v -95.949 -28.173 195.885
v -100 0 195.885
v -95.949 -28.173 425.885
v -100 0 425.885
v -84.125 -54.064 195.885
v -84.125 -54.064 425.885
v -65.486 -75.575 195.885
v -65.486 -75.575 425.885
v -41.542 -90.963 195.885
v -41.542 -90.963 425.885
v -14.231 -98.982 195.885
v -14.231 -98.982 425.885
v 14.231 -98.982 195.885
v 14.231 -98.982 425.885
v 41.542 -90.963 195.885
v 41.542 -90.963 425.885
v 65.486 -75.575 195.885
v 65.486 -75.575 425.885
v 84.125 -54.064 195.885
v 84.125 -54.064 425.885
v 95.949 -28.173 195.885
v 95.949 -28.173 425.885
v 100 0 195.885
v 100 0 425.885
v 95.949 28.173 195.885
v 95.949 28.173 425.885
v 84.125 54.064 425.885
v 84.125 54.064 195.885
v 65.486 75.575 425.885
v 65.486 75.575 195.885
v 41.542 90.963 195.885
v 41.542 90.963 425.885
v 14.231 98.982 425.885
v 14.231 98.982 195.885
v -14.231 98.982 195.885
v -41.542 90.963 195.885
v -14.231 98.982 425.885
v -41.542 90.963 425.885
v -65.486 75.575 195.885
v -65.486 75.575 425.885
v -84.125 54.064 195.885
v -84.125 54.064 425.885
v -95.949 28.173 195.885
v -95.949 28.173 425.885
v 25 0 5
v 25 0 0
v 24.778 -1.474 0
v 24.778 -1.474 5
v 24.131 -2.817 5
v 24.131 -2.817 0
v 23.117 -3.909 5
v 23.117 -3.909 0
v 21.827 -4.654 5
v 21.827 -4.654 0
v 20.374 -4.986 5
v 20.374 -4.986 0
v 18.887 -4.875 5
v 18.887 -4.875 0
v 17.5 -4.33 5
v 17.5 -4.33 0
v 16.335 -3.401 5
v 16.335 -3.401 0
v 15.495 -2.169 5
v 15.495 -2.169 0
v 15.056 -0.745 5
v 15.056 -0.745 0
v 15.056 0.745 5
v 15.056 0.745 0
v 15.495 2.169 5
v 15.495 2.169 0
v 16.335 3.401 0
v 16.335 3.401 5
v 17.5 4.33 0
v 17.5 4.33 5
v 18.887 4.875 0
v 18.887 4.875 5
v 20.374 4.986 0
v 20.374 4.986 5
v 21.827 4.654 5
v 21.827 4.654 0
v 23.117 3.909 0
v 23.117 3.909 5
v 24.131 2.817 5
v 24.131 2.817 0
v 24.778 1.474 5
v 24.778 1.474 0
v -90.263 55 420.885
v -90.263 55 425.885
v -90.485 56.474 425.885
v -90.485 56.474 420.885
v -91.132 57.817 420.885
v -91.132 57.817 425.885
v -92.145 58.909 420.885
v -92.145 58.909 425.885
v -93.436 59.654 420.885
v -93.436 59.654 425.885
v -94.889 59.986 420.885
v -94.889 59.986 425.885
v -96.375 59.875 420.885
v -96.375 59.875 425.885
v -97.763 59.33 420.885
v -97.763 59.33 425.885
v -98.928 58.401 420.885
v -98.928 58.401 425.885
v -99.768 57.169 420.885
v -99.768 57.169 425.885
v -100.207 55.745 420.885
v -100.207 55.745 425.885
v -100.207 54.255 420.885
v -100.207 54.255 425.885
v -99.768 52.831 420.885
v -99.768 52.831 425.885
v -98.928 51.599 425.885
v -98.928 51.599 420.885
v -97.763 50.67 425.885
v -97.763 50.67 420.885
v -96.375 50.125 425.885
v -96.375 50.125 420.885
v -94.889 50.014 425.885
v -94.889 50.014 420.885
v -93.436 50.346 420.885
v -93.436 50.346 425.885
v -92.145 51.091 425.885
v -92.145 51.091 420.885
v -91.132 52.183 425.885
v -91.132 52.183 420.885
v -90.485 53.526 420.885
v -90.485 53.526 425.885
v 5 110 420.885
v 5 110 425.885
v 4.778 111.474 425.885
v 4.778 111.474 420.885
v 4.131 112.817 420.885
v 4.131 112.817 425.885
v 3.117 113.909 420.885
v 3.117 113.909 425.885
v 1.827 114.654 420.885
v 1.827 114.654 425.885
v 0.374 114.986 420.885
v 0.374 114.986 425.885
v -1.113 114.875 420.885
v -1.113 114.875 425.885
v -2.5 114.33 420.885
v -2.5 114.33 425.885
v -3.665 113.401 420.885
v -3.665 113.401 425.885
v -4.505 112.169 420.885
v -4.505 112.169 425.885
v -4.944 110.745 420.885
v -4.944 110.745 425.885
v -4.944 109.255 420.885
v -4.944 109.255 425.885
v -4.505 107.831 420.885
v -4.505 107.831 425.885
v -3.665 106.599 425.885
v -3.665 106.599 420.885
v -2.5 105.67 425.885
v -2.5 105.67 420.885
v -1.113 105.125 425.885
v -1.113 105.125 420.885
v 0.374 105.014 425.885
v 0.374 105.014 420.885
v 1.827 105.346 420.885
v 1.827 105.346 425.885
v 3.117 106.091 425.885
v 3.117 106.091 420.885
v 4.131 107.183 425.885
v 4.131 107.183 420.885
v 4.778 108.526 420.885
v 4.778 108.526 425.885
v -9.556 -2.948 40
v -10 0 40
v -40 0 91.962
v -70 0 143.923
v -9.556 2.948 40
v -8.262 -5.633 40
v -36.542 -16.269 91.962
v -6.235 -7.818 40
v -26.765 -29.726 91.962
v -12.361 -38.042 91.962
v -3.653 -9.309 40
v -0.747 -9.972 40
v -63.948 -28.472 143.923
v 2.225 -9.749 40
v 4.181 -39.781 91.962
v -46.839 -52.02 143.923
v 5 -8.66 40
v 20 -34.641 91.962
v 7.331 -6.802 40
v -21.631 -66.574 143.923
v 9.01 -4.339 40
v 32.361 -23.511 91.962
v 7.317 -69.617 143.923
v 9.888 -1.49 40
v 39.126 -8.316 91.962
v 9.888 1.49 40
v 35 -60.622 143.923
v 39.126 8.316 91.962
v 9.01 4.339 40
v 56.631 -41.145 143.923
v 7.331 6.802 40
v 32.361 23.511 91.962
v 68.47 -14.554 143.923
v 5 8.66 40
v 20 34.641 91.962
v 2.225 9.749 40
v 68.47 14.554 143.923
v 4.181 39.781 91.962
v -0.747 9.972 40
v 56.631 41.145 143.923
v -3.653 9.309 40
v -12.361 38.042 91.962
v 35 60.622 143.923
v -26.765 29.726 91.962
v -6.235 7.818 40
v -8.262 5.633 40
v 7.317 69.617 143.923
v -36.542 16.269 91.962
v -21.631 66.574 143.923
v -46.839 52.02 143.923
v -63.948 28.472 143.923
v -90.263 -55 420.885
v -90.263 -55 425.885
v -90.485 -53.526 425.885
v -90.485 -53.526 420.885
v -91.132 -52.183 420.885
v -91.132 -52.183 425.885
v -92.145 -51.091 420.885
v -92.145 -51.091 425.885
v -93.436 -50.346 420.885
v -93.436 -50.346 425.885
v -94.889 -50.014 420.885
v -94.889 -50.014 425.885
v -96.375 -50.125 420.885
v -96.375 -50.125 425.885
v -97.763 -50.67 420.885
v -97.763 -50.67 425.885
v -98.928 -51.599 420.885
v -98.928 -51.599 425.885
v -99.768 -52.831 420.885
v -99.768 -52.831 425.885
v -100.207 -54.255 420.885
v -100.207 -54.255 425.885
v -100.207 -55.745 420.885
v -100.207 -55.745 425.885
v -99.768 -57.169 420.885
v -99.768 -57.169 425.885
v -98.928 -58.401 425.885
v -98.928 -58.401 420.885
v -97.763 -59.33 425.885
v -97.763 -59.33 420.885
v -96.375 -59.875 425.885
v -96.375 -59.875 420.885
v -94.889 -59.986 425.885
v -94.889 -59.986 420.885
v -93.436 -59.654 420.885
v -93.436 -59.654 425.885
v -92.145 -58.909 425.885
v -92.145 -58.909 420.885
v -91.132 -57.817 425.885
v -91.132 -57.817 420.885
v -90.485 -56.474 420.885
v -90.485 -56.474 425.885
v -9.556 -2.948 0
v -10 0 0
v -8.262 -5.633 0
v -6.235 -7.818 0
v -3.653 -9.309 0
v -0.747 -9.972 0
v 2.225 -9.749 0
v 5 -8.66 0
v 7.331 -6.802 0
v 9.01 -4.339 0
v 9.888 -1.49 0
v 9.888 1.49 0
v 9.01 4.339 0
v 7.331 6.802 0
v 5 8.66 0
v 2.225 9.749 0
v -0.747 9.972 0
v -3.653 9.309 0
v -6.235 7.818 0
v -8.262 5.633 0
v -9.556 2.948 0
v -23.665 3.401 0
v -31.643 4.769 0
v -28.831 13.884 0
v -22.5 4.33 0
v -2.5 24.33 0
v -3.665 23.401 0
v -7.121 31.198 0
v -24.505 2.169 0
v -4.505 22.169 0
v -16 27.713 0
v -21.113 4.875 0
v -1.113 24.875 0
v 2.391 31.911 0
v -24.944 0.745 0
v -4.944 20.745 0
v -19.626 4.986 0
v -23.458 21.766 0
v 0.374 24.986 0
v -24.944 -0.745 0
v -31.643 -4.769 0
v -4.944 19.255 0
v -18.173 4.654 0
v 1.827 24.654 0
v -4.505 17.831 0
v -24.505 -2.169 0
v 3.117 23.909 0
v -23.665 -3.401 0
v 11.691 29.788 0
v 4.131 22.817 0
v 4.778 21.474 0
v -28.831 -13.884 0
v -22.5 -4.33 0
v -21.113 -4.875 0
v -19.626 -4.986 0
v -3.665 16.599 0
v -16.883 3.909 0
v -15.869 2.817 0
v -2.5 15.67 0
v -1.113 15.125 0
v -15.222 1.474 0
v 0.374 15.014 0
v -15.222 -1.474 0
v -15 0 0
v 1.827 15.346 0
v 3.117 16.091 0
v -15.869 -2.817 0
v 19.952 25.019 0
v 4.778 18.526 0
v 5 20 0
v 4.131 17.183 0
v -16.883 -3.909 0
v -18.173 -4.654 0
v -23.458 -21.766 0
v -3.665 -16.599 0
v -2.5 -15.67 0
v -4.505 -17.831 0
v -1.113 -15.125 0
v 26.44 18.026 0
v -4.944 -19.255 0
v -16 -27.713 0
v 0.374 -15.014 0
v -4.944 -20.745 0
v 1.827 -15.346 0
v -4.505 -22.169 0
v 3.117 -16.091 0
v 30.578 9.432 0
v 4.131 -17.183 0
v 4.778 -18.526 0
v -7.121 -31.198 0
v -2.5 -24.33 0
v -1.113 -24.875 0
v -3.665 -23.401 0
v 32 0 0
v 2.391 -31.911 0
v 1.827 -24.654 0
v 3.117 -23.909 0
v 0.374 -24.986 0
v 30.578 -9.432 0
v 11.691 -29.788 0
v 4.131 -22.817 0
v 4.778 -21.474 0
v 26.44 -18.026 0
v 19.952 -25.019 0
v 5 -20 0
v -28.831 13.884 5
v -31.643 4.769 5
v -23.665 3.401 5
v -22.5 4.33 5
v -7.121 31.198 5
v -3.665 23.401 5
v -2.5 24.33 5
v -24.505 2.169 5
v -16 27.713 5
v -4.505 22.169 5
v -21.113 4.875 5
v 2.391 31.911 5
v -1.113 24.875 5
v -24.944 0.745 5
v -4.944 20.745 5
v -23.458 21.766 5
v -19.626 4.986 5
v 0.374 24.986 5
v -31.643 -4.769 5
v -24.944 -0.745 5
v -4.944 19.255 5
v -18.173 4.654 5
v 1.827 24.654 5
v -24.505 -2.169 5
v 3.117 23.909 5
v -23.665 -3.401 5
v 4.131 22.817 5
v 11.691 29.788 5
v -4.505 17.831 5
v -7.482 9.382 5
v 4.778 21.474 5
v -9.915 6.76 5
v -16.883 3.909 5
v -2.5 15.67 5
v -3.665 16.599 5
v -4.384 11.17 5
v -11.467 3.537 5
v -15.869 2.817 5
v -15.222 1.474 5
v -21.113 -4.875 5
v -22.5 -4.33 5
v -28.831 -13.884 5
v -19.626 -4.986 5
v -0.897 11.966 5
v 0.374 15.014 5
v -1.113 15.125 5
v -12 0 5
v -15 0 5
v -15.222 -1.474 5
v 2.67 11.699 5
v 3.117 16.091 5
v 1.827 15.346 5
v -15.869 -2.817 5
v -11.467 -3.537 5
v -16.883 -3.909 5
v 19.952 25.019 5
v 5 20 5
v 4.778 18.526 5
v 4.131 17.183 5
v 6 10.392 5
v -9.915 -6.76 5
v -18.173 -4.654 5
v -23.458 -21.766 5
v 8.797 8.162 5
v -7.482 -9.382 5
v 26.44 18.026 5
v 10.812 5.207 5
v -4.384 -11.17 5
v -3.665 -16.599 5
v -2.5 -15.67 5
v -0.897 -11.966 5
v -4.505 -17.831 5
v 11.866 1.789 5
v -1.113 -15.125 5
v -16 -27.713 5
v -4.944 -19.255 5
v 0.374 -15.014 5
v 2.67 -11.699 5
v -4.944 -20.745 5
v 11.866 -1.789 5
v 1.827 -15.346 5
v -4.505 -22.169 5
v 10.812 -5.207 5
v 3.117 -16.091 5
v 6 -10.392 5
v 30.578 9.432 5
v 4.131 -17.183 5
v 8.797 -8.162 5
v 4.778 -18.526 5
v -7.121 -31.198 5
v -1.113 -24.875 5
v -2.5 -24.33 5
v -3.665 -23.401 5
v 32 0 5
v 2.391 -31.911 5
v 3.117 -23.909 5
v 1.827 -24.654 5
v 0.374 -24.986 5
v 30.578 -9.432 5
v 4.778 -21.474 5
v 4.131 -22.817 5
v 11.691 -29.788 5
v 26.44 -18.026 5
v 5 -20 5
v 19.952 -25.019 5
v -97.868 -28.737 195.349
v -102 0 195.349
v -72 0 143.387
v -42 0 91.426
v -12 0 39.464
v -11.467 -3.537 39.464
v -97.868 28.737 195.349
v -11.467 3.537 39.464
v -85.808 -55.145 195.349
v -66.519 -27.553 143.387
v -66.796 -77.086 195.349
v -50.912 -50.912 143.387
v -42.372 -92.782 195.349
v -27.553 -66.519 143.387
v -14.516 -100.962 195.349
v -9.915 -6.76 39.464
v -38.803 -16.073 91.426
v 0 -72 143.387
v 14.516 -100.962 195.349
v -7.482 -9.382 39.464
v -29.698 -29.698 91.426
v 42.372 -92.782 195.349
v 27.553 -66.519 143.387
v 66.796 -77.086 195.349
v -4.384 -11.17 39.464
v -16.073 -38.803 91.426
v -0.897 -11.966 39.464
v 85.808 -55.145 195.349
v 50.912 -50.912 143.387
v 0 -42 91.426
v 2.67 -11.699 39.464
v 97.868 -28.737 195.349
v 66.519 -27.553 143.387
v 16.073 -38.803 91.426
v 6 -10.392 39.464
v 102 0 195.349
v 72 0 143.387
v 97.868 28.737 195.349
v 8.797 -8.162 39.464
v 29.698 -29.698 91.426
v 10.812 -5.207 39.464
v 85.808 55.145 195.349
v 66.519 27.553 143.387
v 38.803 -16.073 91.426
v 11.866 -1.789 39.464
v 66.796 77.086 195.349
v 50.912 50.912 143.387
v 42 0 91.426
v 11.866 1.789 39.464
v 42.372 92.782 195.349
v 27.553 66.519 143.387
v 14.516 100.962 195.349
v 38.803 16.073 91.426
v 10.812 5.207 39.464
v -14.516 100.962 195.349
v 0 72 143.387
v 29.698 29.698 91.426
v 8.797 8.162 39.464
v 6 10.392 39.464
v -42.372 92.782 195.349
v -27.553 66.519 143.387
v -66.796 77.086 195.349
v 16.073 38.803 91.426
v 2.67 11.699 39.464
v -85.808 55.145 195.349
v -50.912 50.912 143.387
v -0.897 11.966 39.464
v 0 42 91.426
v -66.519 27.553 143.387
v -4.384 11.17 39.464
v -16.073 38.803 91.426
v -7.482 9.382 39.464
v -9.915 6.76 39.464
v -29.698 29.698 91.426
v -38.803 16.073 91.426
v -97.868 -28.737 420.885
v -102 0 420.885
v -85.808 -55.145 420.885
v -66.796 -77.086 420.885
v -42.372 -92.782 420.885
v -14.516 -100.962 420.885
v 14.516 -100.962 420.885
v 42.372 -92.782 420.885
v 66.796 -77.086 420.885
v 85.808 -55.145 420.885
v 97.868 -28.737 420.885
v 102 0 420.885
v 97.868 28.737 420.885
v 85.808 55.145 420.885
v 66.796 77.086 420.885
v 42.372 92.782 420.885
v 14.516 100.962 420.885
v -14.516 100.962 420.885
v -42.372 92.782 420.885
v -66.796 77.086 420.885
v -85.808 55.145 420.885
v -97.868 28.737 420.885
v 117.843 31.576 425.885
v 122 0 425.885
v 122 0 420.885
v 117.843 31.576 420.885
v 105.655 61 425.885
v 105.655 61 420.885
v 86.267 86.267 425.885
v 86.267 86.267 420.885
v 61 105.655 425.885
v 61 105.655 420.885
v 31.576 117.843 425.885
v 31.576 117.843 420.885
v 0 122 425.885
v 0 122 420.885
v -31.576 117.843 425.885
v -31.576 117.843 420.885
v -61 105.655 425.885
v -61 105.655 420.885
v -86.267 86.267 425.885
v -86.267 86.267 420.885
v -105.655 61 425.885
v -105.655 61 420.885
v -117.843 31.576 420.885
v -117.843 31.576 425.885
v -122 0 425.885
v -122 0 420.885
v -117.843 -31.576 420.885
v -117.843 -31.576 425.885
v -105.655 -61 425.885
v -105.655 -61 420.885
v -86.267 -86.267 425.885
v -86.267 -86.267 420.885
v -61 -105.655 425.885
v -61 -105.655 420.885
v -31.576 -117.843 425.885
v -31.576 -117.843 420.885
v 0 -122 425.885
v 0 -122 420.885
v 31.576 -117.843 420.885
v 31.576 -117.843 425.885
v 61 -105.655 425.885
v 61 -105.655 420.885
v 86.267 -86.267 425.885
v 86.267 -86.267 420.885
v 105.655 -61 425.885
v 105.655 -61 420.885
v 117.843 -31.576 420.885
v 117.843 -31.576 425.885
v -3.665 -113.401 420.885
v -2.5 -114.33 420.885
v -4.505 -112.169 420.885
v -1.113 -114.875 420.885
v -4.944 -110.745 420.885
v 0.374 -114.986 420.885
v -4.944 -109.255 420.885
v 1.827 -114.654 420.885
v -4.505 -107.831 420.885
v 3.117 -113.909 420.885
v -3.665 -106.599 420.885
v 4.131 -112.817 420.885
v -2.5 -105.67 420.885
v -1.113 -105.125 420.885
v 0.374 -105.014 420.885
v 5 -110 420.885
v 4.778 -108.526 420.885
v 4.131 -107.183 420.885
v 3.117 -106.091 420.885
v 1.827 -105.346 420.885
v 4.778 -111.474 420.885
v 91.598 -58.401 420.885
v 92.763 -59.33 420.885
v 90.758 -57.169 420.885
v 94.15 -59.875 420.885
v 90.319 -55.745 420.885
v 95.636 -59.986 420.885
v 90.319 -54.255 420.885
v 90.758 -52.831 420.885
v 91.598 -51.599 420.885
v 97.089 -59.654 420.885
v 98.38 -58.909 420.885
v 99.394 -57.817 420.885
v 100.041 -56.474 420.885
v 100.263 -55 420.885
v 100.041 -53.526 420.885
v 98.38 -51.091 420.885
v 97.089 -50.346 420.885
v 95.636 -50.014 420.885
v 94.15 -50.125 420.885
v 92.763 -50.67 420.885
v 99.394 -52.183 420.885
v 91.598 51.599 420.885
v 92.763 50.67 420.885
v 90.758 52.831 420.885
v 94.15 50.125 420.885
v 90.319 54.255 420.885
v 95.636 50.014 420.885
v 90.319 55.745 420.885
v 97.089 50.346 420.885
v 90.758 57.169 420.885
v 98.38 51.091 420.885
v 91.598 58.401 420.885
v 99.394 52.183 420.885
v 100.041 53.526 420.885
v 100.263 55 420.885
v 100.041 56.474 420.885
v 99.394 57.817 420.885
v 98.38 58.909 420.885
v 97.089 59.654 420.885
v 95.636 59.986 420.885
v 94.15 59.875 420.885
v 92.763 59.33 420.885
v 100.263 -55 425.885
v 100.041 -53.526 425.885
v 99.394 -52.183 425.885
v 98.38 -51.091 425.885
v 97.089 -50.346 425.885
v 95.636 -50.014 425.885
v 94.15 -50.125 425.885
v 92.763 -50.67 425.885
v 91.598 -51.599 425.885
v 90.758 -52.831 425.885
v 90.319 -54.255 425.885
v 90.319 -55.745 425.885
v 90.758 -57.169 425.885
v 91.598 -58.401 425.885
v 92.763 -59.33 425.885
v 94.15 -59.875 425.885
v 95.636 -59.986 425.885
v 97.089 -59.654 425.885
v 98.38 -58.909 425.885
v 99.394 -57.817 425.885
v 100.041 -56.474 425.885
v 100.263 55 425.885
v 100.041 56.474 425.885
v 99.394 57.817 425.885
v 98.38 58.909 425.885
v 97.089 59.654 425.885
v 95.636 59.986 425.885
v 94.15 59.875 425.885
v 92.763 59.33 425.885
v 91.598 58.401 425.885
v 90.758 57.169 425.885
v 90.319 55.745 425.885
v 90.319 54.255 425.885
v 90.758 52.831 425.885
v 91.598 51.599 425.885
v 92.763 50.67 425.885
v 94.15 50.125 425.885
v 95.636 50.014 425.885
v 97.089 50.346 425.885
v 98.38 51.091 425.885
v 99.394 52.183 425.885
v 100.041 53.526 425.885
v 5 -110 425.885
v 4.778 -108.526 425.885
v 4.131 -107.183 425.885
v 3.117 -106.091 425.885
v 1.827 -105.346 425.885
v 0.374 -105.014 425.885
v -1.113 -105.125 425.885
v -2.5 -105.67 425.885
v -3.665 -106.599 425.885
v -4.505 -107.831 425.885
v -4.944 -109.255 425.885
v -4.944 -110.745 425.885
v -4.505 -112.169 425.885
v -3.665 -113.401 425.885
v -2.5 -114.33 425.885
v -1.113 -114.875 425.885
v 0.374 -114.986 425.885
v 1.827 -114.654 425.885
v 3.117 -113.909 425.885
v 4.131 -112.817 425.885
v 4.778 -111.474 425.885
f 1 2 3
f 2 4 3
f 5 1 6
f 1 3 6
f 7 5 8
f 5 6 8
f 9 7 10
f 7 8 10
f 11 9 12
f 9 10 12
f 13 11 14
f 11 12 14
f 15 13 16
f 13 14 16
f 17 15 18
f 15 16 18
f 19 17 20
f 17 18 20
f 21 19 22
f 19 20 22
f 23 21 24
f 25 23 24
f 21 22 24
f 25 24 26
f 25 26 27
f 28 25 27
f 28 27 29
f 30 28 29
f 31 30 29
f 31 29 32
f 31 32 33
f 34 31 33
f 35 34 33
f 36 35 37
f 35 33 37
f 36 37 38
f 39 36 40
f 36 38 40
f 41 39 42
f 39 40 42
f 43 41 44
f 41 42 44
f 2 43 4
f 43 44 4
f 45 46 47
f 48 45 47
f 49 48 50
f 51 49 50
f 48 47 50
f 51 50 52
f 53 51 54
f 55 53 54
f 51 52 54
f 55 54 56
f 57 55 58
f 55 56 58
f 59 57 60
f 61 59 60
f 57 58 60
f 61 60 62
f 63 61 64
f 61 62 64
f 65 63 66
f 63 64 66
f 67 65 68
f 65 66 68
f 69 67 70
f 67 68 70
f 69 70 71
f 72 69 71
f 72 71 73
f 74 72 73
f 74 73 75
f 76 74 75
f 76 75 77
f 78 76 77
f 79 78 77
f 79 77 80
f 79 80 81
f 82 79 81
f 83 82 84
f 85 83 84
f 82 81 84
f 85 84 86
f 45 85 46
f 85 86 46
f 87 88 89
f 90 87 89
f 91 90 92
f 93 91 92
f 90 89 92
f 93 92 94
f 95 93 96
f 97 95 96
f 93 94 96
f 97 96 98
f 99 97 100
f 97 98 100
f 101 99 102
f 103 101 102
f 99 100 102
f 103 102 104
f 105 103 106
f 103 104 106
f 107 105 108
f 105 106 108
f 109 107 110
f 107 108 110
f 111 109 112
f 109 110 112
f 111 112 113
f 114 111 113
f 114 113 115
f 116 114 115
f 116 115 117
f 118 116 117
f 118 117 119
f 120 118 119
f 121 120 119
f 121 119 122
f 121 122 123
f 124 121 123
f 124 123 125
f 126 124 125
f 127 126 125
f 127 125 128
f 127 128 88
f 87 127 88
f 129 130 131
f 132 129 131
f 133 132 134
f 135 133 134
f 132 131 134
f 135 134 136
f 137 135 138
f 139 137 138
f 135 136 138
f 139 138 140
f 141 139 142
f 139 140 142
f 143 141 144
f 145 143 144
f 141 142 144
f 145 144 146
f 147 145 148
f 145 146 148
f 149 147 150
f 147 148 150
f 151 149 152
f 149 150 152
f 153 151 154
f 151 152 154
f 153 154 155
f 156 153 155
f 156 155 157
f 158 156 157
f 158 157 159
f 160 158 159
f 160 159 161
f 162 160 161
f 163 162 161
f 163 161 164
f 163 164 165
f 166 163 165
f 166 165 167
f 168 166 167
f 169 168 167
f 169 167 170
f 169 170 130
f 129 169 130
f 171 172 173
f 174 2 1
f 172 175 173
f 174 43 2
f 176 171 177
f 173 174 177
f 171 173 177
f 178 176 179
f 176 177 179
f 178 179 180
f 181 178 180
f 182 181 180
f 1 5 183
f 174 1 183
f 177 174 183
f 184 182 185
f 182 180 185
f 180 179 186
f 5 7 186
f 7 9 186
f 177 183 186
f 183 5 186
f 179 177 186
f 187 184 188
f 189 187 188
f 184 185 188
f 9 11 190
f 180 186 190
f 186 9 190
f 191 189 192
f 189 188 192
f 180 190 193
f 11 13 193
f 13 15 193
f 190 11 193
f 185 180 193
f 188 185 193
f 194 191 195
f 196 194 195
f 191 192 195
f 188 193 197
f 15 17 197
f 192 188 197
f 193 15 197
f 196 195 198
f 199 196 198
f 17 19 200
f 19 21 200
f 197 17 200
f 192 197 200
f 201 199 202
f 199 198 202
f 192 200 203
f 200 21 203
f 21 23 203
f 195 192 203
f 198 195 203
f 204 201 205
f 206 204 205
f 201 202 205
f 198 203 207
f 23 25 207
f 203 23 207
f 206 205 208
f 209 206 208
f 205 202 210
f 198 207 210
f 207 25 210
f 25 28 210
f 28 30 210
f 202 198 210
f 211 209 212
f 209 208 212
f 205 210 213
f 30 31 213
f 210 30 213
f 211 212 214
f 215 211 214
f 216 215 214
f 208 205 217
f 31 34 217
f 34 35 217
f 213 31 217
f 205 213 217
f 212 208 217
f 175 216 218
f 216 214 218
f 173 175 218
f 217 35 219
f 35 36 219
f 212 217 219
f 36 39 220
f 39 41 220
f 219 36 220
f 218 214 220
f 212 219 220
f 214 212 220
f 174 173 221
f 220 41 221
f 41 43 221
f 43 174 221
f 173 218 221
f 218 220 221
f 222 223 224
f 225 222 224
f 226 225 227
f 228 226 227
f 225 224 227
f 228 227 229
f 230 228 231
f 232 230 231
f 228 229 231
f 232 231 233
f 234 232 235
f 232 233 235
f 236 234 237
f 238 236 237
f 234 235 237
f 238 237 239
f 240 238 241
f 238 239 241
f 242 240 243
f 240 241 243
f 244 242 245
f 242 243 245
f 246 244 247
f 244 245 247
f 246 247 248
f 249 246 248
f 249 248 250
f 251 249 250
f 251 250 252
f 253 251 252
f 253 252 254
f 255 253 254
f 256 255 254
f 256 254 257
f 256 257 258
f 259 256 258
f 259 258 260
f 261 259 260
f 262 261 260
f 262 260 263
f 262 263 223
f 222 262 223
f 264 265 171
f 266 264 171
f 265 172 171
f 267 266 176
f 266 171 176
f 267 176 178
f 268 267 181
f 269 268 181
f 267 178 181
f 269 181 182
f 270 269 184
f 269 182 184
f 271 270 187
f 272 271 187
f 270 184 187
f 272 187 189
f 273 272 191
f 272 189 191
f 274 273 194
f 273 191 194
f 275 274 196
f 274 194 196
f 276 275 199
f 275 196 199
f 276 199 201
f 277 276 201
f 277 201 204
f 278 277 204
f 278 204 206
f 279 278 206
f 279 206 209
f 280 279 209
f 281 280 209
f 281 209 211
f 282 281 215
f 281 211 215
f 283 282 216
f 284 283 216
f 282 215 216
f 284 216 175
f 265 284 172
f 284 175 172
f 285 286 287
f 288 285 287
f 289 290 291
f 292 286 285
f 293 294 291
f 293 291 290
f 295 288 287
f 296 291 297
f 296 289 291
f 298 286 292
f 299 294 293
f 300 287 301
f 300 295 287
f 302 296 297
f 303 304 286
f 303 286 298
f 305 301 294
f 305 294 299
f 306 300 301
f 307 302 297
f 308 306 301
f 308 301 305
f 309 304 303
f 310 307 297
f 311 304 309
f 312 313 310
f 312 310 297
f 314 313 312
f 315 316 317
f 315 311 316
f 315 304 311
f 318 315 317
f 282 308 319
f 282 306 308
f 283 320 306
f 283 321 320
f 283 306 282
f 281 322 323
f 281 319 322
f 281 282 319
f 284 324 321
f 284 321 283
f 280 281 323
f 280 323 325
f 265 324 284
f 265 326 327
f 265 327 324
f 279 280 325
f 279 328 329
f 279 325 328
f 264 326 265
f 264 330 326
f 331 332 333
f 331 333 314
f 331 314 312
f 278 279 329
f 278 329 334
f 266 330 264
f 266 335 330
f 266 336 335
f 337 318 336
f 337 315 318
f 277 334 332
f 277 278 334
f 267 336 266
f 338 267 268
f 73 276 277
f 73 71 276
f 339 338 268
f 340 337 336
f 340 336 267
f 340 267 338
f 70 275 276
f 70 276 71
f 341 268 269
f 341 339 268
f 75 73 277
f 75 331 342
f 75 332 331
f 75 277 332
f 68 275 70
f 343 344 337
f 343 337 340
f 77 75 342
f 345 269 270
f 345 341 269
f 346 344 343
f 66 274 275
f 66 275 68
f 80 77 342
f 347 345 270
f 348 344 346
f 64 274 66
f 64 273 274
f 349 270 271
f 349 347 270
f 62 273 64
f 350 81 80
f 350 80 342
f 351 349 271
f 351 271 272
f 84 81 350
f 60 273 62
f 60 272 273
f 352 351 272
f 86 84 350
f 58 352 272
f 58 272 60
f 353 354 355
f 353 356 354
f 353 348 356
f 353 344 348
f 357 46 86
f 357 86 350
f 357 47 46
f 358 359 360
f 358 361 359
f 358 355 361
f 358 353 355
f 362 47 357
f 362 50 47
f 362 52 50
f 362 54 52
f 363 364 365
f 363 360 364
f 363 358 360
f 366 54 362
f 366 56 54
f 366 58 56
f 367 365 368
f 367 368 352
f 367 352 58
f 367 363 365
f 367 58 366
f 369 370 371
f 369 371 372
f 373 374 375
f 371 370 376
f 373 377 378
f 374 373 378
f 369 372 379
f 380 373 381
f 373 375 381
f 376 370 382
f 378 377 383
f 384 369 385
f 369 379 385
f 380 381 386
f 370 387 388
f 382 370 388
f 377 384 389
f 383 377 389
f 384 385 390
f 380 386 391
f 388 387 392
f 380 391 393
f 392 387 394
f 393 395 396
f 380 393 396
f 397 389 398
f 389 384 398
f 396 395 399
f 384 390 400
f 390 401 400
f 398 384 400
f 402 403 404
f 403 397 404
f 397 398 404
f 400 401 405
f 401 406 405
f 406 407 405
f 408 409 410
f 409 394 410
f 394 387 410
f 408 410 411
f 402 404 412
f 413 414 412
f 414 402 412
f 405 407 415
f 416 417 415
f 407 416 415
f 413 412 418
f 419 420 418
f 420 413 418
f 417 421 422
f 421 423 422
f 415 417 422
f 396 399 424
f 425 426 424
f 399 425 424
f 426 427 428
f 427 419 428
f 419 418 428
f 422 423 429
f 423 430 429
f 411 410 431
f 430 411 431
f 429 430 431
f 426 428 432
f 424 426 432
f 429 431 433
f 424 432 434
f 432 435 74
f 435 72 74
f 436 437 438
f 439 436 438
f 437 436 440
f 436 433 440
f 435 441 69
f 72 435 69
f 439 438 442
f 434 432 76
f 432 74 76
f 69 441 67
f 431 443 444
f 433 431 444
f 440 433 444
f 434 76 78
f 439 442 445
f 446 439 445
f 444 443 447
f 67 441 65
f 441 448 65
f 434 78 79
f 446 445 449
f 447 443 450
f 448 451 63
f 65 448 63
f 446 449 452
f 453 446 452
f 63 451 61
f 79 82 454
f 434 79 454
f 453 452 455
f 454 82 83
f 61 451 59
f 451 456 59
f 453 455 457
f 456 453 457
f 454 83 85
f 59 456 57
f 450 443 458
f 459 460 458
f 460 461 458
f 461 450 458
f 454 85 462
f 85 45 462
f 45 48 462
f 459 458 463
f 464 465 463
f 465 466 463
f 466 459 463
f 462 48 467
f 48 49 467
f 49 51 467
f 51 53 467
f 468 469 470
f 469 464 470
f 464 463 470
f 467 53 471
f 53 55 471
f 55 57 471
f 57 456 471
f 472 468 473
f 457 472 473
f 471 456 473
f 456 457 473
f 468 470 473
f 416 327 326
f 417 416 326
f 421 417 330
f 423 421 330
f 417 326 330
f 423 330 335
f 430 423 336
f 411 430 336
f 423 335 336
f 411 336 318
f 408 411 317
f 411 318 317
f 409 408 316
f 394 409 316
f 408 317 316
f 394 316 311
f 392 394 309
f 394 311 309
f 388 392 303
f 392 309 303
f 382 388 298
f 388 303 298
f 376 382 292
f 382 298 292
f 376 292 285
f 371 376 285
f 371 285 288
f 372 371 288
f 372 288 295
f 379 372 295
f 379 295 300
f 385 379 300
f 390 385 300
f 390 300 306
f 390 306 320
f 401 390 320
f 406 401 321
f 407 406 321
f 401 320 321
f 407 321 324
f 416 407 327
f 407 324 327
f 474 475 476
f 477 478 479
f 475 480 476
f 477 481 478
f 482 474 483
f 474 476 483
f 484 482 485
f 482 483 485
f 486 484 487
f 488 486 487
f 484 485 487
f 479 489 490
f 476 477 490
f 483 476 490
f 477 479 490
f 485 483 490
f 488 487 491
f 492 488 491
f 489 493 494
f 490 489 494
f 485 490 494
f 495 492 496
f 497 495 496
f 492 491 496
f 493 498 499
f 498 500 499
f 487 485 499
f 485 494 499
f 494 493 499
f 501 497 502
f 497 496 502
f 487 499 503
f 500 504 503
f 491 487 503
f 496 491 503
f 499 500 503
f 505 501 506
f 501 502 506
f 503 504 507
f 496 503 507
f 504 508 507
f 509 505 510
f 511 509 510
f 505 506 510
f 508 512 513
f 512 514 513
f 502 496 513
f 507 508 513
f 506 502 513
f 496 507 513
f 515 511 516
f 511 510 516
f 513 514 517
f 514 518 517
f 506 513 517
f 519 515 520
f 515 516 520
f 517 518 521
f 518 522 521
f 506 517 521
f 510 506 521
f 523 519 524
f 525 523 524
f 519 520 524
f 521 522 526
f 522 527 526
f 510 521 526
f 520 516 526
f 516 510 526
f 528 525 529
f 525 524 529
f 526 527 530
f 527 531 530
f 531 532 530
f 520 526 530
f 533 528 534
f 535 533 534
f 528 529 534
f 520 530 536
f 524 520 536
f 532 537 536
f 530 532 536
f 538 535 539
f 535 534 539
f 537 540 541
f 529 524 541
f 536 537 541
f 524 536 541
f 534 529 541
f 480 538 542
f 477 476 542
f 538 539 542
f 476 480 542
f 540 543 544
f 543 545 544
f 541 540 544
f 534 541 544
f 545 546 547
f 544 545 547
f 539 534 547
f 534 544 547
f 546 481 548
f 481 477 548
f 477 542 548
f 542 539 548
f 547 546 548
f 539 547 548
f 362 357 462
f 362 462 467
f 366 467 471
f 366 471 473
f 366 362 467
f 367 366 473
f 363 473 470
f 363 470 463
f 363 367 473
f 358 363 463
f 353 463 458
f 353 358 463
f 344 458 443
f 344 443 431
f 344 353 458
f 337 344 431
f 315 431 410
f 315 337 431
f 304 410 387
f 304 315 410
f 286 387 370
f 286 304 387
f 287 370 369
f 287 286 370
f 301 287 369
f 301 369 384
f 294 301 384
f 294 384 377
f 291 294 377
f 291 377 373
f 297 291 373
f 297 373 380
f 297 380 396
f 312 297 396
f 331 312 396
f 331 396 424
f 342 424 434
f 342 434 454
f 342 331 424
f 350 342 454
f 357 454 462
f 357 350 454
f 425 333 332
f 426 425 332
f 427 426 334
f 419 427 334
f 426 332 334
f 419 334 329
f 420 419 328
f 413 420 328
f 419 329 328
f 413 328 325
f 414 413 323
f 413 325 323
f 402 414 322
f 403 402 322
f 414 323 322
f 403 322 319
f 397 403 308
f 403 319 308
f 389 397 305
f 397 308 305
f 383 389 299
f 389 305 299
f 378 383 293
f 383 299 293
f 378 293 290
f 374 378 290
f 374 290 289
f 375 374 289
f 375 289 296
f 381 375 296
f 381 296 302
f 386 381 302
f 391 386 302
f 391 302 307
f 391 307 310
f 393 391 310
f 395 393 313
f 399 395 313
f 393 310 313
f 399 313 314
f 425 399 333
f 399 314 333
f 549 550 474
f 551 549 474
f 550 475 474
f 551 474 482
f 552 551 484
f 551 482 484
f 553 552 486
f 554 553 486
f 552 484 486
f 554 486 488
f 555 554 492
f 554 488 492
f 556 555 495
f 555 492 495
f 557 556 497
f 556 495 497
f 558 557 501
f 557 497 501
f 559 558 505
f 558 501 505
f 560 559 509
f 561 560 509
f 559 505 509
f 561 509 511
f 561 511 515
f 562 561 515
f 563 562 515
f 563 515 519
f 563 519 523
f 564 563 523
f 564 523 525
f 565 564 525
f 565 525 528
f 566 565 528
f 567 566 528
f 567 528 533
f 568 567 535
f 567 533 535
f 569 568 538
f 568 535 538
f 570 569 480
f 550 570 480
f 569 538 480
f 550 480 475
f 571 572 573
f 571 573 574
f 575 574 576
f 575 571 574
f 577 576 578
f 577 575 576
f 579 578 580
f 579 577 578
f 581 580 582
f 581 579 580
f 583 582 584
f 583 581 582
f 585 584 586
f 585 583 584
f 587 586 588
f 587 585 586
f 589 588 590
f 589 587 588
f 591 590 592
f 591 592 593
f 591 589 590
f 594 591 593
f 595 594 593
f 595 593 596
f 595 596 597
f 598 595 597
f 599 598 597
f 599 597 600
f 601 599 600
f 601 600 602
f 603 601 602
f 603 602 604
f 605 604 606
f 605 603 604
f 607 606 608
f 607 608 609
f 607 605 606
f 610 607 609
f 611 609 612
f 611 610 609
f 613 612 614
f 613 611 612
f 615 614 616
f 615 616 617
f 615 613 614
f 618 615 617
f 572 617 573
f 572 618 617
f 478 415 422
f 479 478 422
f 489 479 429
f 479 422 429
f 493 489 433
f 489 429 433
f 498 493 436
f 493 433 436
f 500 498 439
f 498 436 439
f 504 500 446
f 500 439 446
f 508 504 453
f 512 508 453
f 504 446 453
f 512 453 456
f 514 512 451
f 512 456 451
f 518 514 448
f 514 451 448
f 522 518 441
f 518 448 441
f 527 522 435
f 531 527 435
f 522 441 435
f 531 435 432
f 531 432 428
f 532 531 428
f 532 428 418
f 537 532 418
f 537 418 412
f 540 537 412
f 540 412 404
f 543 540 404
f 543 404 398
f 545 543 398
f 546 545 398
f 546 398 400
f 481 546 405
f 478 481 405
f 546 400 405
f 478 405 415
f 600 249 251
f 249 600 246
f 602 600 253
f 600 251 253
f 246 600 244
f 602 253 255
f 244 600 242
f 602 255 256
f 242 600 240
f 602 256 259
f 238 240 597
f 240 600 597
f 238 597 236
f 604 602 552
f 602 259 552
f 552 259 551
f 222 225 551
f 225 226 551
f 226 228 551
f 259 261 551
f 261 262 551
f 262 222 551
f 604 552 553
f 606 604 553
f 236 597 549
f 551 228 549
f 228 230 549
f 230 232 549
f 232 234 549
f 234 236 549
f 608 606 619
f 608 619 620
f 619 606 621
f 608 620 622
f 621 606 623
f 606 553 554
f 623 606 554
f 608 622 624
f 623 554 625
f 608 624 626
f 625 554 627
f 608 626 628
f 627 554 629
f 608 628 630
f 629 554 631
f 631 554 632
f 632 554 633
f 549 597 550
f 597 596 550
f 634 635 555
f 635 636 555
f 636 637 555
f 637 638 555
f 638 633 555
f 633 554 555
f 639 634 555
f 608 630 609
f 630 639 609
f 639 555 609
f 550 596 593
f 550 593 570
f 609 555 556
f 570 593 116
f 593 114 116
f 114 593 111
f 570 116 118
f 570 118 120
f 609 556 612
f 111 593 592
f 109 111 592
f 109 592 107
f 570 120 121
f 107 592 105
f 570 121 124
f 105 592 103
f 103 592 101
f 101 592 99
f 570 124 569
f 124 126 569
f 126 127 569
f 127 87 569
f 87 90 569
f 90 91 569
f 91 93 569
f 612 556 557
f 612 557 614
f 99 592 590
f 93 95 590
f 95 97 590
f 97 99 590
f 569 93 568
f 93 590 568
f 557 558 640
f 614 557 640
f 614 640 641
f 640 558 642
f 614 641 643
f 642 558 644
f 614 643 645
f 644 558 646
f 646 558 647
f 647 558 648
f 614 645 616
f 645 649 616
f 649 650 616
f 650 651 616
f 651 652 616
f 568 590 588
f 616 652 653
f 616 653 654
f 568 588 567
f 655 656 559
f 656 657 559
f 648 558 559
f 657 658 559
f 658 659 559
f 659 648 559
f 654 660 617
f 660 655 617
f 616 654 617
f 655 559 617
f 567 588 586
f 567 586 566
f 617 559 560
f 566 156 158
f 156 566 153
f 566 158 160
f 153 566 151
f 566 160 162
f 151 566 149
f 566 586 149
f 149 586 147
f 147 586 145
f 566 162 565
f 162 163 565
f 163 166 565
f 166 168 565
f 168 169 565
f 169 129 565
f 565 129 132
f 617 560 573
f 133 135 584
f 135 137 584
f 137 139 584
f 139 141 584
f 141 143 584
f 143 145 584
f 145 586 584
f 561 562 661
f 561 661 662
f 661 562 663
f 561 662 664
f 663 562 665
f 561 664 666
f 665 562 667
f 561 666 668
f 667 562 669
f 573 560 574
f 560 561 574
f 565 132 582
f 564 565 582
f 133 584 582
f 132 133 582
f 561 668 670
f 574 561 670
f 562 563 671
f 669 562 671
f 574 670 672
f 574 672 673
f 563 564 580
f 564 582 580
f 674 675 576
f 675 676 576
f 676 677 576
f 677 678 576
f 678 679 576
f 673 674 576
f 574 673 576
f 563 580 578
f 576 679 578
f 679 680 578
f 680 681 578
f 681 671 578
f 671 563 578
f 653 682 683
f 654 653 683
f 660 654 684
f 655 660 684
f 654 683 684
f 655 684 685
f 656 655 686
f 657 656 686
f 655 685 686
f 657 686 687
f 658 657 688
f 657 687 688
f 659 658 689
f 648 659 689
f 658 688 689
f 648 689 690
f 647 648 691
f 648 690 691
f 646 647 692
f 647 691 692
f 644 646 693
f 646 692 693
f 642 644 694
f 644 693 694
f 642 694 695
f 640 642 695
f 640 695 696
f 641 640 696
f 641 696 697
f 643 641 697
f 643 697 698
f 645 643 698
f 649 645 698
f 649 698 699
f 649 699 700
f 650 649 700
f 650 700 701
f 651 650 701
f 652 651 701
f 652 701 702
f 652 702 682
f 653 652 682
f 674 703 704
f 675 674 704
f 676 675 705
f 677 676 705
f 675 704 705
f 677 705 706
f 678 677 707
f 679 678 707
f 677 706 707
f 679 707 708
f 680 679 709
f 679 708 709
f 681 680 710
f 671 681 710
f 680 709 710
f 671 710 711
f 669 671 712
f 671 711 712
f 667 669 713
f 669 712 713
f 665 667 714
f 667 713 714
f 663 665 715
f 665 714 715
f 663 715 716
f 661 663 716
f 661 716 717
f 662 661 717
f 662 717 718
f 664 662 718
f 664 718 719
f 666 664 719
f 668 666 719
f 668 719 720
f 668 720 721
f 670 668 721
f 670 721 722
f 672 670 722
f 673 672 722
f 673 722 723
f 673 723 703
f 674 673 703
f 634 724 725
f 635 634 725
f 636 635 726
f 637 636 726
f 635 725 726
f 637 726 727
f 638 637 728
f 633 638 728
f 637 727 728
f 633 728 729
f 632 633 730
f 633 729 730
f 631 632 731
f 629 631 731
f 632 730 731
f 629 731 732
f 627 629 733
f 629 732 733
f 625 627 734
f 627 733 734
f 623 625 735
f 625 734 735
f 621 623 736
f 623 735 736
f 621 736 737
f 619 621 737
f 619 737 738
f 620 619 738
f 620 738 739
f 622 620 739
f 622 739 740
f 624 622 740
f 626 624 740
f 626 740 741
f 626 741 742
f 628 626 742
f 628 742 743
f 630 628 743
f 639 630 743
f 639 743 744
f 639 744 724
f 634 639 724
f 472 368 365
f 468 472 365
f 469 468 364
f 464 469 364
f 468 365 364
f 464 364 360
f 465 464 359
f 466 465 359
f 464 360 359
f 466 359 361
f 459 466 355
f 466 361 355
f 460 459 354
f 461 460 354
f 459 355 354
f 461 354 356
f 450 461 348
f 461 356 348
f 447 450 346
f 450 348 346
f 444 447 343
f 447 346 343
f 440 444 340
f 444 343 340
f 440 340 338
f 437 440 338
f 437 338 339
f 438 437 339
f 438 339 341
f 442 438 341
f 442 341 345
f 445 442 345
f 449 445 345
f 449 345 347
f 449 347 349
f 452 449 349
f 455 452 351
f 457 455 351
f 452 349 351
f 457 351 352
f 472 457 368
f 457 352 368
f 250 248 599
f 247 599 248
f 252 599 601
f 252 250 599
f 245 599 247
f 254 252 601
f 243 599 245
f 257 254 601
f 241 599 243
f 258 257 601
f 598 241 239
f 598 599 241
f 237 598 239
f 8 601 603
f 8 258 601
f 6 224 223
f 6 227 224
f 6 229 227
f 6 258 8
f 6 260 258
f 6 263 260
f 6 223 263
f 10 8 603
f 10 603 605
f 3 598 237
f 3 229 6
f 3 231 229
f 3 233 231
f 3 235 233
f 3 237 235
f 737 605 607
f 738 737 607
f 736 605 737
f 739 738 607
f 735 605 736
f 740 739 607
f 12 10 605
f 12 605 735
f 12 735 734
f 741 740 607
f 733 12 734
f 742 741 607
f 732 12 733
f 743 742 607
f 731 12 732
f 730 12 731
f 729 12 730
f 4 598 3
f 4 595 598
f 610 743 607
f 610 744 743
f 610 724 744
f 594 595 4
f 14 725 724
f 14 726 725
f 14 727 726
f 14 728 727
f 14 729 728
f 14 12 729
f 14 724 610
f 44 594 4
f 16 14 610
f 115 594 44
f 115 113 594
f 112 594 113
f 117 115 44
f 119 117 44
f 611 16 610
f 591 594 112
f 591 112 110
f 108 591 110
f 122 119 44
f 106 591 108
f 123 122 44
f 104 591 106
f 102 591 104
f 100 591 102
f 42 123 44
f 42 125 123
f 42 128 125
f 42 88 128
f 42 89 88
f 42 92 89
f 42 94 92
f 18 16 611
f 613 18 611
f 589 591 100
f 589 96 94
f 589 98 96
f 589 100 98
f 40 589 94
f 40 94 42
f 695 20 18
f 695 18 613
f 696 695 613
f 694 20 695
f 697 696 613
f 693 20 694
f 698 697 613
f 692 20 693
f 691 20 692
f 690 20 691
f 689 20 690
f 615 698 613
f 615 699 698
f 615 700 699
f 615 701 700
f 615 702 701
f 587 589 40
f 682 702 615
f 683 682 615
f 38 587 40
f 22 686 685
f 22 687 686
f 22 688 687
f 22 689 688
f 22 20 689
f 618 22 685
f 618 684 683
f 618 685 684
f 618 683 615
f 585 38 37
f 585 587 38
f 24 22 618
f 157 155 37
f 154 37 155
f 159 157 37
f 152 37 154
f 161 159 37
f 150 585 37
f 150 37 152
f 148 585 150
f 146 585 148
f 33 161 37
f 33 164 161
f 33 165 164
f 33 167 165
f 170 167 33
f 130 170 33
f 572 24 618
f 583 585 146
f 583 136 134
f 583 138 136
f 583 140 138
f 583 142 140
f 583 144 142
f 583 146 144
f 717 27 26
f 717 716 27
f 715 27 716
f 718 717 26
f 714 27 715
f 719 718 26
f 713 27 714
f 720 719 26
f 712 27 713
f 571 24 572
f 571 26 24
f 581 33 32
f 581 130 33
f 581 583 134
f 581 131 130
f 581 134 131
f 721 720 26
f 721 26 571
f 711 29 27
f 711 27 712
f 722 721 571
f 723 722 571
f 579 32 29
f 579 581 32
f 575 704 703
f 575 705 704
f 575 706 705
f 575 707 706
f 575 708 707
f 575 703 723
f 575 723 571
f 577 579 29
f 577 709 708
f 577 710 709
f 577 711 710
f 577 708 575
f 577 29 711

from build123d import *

# Parameters (mm, degrees)
F2_R     = 122
F2_R_2   = 102
F3_DEPTH = 5
F4_R     = 32
F4_R_2   = 12
F5_DEPTH = 5
F6_R     = 5
F7_DEPTH = 425.8855726812
F8_R     = 5
F9_DEPTH = 5


with BuildPart() as f1:
    # F0 (on Front) → F1 (revolve)
    with BuildSketch(Plane.XZ):
        Polygon((-100, 195.8845726812), (-100, 425.8845726812), (-102, 425.8845726812), (-102, 195.3486742963), (-12, 39.4641016151), (-12, 0), (-10, 0), (-10, 40), align=None)
    revolve(axis=Axis((0, 0, 212.9422863406), (0, 0, 1)))

    # F2 (on face) → F3 (join)
    with BuildSketch(Plane.XY.offset(425.8845726812)):
        Circle(F2_R)
        Circle(F2_R_2, mode=Mode.SUBTRACT)
    extrude(amount=-F3_DEPTH)

    # F4 (on face) → F5 (join)
    with BuildSketch(Plane(origin=(0, 0, 0), x_dir=(1, 0, 0), z_dir=(0, 0, -1))):
        Circle(F4_R)
        Circle(F4_R_2, mode=Mode.SUBTRACT)
    extrude(amount=-F5_DEPTH)

    # F6 (on face) → F7 (cut, through all)
    with BuildSketch(Plane.XY.offset(425.8845726812)):
        with Locations((0, 110)):
            Circle(F6_R)
        with Locations((-95.2627944163, 55)):
            Circle(F6_R)
        with Locations((-95.2627944163, -55)):
            Circle(F6_R)
        with Locations((0, -110)):
            Circle(F6_R)
        with Locations((95.2627944163, -55)):
            Circle(F6_R)
        with Locations((95.2627944163, 55)):
            Circle(F6_R)
    extrude(amount=-F7_DEPTH, mode=Mode.SUBTRACT)

    # F8 (on face) → F9 (cut, through all)
    with BuildSketch(Plane(origin=(0, 0, 0), x_dir=(1, 0, 0), z_dir=(0, 0, -1))):
        with Locations((0, 20)):
            Circle(F8_R)
        with Locations((-20, 0)):
            Circle(F8_R)
        with Locations((0, -20)):
            Circle(F8_R)
        with Locations((20, 0)):
            Circle(F8_R)
    extrude(amount=-F9_DEPTH, mode=Mode.SUBTRACT)


solid = f1.part
